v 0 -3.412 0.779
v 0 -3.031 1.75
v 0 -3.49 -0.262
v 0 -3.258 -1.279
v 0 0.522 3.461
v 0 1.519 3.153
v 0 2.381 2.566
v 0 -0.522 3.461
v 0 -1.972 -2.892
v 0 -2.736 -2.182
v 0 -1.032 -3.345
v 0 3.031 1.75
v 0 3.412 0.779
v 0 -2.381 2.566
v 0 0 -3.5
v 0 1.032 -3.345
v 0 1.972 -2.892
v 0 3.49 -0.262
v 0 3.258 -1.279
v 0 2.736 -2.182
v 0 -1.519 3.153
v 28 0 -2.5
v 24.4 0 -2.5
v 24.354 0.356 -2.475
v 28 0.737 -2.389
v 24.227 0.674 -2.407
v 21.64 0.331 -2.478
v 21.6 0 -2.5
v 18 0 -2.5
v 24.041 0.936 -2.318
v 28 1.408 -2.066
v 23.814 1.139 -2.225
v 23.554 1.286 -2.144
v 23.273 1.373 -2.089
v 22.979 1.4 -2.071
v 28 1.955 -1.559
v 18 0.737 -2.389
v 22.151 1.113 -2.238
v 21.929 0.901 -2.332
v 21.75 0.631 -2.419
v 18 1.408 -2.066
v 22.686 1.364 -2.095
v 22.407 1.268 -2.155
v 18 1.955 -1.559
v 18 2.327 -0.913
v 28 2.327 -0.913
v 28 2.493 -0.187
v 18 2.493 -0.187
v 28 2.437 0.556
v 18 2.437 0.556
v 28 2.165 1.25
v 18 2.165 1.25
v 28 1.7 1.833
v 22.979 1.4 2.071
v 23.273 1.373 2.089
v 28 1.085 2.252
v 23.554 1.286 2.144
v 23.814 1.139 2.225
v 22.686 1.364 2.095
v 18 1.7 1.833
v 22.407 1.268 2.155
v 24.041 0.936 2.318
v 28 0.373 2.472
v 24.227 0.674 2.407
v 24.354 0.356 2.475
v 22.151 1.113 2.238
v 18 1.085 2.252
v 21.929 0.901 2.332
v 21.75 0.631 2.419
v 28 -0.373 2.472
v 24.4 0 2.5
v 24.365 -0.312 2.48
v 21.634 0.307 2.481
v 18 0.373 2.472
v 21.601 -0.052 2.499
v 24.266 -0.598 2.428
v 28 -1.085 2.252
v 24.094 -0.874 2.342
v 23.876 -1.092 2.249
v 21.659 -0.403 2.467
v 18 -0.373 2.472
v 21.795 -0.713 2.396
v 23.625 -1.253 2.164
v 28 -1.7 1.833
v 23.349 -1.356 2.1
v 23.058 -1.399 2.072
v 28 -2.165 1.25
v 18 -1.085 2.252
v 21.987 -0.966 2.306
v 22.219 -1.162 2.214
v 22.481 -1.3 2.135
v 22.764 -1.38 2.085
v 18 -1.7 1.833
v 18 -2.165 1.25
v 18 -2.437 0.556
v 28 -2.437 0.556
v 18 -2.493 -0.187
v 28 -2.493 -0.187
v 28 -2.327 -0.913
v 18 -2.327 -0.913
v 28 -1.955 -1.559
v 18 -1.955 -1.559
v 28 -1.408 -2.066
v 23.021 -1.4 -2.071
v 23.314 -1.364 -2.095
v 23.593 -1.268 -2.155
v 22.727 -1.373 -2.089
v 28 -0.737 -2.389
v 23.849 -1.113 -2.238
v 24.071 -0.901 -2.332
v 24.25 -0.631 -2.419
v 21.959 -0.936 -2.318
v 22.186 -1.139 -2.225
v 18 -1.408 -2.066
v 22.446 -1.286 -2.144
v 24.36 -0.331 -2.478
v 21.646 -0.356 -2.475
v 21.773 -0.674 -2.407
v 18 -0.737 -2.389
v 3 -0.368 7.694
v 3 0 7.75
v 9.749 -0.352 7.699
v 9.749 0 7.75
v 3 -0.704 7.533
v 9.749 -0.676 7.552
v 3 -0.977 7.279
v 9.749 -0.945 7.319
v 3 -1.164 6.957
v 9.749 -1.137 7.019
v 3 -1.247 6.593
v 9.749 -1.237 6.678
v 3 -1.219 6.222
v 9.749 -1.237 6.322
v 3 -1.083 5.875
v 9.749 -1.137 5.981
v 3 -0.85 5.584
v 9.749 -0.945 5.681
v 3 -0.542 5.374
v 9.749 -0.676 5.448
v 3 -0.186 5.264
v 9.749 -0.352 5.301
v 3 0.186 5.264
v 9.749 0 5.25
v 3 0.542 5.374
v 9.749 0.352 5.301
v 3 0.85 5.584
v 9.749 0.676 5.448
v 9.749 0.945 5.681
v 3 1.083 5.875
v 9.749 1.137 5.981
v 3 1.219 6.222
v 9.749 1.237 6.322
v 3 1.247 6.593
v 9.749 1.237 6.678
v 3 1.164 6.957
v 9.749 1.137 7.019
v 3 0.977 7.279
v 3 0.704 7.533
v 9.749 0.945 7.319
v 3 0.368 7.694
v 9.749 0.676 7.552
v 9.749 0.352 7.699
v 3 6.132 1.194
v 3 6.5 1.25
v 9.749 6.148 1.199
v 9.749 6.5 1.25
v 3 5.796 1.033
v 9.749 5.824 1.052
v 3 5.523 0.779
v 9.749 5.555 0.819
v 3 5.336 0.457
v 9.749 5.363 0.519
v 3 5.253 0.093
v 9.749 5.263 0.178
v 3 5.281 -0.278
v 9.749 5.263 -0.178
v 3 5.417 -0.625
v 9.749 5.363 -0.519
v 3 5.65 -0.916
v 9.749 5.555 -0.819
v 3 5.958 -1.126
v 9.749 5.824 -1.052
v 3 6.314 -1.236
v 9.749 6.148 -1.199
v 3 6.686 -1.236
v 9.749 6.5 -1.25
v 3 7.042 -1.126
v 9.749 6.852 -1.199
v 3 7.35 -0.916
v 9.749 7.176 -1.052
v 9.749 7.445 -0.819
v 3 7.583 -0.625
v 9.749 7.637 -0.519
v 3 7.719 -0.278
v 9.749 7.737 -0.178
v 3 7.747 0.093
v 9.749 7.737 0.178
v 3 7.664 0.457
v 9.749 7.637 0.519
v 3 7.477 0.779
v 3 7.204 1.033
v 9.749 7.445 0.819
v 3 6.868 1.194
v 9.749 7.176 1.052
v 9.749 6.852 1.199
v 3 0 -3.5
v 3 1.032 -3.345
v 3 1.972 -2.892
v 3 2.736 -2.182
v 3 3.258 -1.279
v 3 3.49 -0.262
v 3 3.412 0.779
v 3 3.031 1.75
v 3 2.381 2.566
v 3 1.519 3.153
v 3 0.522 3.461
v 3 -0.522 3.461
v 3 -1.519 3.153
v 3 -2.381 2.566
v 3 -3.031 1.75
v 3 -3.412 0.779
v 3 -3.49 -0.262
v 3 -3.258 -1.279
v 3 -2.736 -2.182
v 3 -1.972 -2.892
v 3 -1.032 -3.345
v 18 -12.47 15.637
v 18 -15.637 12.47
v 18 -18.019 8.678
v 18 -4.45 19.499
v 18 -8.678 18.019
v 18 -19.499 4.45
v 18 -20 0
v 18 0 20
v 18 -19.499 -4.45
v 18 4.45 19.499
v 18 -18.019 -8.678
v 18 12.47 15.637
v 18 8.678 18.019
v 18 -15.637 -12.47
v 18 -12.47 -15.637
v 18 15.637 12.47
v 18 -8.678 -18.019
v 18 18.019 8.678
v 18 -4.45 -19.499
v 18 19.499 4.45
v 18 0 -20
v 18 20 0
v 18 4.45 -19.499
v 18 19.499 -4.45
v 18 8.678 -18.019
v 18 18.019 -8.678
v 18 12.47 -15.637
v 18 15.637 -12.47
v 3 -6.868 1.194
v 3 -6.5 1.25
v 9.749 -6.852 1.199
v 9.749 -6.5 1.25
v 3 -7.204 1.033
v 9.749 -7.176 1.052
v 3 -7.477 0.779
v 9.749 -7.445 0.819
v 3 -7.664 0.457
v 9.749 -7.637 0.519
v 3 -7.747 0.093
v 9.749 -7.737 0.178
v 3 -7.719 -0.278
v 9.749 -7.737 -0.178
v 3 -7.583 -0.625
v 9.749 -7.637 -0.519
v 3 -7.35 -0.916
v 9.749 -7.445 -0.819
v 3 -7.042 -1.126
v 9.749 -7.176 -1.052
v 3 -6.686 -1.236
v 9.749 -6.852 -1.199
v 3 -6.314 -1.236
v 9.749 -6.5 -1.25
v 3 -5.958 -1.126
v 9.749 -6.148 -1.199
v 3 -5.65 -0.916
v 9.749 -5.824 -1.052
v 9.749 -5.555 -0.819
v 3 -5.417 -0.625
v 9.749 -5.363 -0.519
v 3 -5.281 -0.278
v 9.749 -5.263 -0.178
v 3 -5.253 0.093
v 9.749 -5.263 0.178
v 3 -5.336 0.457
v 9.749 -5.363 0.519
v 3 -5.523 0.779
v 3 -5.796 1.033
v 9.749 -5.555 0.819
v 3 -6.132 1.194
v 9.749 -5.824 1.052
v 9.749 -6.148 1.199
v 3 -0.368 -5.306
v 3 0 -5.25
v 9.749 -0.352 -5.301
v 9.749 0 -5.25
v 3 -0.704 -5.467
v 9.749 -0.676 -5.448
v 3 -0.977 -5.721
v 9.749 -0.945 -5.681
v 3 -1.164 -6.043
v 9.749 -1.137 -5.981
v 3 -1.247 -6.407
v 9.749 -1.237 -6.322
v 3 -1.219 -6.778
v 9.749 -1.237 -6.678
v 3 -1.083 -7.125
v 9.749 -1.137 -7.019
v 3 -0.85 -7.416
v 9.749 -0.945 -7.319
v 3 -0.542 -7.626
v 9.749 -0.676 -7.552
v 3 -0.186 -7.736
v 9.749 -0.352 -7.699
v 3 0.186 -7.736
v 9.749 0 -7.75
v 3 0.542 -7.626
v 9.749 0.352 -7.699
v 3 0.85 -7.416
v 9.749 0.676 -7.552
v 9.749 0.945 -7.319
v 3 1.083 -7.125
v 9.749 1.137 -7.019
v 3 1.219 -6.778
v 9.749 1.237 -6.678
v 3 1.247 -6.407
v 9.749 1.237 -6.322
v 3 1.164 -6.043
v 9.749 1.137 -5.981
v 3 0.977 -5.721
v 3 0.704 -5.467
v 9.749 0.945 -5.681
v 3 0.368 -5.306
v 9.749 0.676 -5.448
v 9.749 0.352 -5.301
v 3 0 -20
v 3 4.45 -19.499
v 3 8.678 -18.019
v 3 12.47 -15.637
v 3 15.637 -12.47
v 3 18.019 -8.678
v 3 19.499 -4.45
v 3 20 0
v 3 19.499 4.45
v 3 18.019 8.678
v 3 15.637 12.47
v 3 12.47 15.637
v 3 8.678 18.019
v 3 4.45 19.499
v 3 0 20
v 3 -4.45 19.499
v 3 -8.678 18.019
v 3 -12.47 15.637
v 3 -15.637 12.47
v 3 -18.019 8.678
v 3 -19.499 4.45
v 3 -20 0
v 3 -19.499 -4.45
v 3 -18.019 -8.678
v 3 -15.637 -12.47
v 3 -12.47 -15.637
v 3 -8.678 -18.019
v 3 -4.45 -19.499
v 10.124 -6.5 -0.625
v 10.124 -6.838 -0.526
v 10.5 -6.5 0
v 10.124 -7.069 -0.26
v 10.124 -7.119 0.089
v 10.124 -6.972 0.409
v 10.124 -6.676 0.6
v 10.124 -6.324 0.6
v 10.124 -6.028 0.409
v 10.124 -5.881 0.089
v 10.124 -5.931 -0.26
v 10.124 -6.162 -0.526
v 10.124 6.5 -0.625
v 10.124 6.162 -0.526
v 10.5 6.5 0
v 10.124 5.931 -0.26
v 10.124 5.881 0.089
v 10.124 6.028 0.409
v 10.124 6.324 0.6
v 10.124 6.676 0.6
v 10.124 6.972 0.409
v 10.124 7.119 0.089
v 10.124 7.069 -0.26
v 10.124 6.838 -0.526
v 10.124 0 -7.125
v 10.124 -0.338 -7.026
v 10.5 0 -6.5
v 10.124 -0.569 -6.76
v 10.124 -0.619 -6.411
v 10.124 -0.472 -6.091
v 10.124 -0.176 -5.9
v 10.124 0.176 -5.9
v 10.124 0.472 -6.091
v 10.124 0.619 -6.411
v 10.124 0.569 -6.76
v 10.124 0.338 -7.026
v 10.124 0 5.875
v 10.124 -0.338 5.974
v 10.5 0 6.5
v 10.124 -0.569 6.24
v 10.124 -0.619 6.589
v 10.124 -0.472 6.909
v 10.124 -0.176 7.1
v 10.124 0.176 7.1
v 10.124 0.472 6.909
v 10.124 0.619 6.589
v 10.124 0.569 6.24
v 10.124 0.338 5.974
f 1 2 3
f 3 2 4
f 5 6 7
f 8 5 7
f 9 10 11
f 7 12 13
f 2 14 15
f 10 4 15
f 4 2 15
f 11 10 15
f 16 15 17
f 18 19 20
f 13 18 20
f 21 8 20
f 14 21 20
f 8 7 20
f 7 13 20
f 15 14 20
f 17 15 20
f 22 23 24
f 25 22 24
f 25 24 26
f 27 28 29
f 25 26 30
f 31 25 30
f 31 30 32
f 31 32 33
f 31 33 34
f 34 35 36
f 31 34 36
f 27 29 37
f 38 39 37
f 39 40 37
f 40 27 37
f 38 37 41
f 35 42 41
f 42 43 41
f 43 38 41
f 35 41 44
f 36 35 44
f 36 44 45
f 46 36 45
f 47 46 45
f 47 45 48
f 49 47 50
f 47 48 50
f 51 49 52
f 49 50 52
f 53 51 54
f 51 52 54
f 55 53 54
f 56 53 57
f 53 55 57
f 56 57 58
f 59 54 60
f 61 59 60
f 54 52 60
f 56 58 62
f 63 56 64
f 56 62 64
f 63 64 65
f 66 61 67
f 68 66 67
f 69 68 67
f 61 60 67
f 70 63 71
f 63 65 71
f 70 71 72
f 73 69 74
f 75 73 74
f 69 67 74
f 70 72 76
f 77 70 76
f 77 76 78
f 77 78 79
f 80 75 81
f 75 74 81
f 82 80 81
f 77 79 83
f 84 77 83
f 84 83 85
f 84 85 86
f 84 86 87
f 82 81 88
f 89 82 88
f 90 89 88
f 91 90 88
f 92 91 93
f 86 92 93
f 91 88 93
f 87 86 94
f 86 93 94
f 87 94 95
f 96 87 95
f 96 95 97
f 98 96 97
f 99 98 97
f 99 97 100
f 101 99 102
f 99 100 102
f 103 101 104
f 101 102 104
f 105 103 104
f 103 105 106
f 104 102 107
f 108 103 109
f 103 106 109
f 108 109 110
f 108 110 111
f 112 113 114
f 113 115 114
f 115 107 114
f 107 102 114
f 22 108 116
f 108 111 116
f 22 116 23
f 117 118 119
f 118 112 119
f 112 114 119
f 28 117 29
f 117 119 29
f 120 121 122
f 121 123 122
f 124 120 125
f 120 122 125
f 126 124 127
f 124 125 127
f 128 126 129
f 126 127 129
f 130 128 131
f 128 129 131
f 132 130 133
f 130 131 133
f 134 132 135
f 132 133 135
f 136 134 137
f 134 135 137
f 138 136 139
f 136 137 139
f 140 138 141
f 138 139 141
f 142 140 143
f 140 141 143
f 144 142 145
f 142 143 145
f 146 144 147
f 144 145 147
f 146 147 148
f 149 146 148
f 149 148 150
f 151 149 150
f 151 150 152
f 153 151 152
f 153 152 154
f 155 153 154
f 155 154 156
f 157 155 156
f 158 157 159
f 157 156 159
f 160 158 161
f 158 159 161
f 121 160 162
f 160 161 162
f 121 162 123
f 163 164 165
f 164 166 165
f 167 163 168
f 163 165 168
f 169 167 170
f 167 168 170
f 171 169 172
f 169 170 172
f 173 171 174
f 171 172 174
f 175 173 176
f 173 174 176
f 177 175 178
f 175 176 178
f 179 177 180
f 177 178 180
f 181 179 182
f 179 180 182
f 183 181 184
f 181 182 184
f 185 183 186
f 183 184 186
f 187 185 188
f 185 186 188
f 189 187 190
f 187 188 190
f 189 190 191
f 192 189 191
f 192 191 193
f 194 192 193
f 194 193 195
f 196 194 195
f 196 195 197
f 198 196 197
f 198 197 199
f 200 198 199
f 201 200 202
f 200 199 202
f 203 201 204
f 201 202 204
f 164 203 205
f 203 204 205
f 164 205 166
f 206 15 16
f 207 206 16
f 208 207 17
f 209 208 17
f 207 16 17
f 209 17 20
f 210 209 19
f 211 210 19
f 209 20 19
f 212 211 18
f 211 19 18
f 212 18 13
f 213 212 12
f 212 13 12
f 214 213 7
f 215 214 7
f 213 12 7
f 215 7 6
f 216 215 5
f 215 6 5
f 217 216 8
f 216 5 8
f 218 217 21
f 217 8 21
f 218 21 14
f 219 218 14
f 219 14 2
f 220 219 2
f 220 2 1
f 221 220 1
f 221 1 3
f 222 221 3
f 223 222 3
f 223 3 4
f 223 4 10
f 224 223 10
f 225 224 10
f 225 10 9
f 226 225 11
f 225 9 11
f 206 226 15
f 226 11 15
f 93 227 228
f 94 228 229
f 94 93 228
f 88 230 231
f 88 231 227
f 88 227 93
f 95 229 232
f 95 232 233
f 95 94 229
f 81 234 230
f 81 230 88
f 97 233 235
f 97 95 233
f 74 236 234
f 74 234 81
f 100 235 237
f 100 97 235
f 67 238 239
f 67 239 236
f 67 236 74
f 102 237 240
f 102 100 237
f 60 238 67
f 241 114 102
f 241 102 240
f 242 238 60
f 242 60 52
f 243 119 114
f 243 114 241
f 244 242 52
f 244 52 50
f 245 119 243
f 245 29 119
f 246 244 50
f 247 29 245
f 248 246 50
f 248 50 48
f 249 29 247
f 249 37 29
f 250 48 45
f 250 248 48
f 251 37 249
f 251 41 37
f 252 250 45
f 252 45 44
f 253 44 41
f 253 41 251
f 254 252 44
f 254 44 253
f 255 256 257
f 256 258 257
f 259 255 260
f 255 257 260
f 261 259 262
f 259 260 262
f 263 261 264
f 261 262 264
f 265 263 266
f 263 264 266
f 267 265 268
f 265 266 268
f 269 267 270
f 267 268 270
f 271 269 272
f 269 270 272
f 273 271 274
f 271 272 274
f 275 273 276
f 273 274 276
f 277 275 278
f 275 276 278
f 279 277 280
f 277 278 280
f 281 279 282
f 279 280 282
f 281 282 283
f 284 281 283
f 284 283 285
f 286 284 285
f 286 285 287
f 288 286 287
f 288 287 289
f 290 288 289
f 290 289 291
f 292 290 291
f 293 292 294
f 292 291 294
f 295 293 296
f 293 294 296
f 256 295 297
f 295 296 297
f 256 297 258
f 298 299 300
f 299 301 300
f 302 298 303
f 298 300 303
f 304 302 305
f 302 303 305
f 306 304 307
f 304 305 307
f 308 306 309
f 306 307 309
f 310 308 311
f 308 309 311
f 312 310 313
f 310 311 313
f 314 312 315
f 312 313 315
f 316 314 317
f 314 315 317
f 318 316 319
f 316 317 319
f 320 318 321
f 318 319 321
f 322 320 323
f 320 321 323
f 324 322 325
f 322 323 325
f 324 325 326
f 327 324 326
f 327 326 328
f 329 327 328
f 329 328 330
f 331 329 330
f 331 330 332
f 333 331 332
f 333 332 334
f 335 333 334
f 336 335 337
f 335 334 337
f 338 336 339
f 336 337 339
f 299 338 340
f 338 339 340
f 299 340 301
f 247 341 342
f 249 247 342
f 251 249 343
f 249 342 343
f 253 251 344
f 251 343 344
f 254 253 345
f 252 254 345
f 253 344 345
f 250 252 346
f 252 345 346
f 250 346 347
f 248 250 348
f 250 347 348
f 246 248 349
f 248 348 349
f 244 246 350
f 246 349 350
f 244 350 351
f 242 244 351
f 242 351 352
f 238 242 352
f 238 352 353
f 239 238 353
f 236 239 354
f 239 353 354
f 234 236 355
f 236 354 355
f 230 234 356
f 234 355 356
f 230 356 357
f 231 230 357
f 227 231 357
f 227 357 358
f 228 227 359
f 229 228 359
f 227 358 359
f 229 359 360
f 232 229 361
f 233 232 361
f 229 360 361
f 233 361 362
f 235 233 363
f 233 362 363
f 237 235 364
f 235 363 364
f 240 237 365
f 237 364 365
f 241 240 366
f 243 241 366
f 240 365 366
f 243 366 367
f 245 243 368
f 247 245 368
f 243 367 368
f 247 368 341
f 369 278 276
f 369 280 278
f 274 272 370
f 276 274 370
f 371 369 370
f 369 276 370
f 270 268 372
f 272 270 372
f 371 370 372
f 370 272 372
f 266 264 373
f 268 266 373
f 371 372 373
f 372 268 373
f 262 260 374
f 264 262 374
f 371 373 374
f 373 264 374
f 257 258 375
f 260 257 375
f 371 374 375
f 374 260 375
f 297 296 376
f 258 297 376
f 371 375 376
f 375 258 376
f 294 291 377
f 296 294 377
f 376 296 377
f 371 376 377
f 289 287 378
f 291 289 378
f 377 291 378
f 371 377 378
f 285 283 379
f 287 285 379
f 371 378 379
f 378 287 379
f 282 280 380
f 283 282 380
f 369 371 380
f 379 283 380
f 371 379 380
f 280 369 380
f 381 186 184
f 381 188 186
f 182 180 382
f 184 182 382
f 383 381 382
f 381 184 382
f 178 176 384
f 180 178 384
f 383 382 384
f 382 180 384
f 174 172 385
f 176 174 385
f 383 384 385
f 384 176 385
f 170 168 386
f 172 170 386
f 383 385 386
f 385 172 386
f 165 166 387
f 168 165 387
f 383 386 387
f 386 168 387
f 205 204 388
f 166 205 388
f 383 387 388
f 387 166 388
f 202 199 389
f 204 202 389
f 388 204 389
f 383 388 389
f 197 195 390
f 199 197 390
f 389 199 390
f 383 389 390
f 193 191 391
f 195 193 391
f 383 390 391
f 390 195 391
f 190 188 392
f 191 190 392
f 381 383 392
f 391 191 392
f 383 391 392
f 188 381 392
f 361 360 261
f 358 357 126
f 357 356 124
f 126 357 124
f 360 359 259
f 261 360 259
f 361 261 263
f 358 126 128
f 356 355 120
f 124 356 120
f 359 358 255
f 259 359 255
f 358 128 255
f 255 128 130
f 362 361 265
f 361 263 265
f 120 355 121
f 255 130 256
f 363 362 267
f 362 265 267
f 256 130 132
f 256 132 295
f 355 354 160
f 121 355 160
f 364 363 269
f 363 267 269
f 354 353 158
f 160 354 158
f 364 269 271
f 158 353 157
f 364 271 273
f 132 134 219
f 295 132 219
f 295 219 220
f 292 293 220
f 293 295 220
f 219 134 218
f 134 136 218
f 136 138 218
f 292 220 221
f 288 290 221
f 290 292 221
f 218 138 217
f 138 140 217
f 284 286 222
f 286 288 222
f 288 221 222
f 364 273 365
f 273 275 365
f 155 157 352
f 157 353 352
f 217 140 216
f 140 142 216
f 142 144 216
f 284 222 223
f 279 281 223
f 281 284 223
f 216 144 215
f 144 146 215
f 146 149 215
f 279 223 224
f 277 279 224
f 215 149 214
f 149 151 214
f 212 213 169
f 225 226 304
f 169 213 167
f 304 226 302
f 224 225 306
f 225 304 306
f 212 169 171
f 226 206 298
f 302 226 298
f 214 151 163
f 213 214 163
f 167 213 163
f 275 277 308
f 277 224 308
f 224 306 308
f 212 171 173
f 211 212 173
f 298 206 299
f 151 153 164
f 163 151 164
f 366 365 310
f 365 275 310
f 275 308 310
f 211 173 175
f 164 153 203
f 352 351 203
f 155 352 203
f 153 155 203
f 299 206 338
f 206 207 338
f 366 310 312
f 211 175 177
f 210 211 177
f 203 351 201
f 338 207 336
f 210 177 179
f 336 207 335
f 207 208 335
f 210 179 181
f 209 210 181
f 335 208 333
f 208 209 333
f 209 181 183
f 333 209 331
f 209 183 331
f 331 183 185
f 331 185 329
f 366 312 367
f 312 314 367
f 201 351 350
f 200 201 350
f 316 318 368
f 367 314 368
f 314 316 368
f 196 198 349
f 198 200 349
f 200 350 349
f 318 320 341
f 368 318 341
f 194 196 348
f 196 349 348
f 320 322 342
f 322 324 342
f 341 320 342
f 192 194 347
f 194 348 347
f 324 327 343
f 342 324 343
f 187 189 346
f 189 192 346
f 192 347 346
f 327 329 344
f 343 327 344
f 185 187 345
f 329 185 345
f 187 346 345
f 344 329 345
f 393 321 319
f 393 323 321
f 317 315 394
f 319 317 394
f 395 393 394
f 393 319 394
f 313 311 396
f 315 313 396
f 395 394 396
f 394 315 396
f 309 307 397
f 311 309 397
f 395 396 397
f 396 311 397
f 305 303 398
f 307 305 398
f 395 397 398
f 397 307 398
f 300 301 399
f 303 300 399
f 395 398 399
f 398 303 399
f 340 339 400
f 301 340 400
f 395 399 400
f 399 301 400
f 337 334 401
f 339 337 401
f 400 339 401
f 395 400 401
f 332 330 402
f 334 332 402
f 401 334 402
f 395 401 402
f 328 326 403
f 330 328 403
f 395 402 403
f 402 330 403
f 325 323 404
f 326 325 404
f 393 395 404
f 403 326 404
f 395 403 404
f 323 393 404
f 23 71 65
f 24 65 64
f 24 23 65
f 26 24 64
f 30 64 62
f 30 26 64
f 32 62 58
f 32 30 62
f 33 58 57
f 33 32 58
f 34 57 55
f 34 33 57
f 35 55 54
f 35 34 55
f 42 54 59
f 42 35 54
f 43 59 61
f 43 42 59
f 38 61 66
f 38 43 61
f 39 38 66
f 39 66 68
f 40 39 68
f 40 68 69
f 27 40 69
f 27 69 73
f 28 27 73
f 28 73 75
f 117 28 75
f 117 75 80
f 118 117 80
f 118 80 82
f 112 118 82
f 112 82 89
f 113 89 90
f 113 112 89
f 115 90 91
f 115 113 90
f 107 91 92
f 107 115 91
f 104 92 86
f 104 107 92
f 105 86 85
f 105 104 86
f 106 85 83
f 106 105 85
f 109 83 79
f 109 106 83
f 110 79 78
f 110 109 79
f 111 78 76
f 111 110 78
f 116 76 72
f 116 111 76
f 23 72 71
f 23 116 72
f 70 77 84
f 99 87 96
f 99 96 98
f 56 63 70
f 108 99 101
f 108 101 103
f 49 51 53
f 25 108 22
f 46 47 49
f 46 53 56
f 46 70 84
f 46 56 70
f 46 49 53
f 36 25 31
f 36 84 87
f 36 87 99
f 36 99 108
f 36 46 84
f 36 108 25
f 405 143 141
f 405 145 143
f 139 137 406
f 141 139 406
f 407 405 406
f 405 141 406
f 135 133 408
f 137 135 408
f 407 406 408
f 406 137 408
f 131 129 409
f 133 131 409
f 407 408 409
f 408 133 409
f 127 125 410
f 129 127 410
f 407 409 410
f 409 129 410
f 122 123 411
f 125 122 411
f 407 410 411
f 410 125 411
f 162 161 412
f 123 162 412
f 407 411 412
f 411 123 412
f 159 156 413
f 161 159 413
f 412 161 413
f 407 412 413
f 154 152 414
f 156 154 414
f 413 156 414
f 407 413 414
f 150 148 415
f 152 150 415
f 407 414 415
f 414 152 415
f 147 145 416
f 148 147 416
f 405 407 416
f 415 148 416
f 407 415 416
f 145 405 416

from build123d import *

# Parameters (mm, degrees)
SKETCH_1_R               = 3.5
EXTRUDE_1_DEPTH          = 3
SKETCH_2_R               = 20
EXTRUDE_2_DEPTH          = 15
SKETCH_3_R               = 2.5
EXTRUDE_3_DEPTH          = 10
CUT_EXTRUDE_1_DEPTH      = 10
CUT_EXTRUDE_1_DEPTH_BACK = 10
SKETCH_4_R               = 1.4
HOLE_WIZARD_M3_1_D       = 2.5
HOLE_WIZARD_M3_1_DEPTH   = 6.748924226
HOLE_WIZARD_M3_1_TIP     = 0.751075774


with BuildPart() as part:
    # 草图1 → 凸台-拉伸1 (new body)
    with BuildSketch(Plane(origin=(0, 0, 0), x_dir=(0, 0, -1), z_dir=(1, 0, 0))):
        Circle(SKETCH_1_R)
    extrude(amount=EXTRUDE_1_DEPTH)

    # 草图2 → 凸台-拉伸2 (add)
    with BuildSketch(Plane(origin=(3, 0, 0), x_dir=(0, 0, -1), z_dir=(1, 0, 0))):
        Circle(SKETCH_2_R)
    extrude(amount=EXTRUDE_2_DEPTH)

    # 草图3 → 凸台-拉伸3 (add)
    with BuildSketch(Plane(origin=(18, 0, 0), x_dir=(0, 0, -1), z_dir=(1, 0, 0))):
        Circle(SKETCH_3_R)
    extrude(amount=EXTRUDE_3_DEPTH)

    # 草图4 → 切除-拉伸1 (cut, two sides: drawn at the far end of the back side and taken through both)
    with BuildSketch(Plane.XY.offset(-CUT_EXTRUDE_1_DEPTH_BACK)):
        with Locations((23, 0)):
            Circle(SKETCH_4_R)
    extrude(amount=CUT_EXTRUDE_1_DEPTH + CUT_EXTRUDE_1_DEPTH_BACK, mode=Mode.SUBTRACT)

    # M3 螺纹孔1
    with Locations(Plane(origin=(3, 0, 6.5), x_dir=(0, 0, -1), z_dir=(-1, 0, 0))):
        with Locations((0, 0), (6.5, 6.5), (13, 0), (6.5, -6.5)):
            Hole(HOLE_WIZARD_M3_1_D / 2, depth=HOLE_WIZARD_M3_1_DEPTH)
            with Locations((0, 0, -(HOLE_WIZARD_M3_1_DEPTH + HOLE_WIZARD_M3_1_TIP / 2))):  # 118° drill point
                Cone(0, HOLE_WIZARD_M3_1_D / 2, HOLE_WIZARD_M3_1_TIP, mode=Mode.SUBTRACT)


solid = part.part
